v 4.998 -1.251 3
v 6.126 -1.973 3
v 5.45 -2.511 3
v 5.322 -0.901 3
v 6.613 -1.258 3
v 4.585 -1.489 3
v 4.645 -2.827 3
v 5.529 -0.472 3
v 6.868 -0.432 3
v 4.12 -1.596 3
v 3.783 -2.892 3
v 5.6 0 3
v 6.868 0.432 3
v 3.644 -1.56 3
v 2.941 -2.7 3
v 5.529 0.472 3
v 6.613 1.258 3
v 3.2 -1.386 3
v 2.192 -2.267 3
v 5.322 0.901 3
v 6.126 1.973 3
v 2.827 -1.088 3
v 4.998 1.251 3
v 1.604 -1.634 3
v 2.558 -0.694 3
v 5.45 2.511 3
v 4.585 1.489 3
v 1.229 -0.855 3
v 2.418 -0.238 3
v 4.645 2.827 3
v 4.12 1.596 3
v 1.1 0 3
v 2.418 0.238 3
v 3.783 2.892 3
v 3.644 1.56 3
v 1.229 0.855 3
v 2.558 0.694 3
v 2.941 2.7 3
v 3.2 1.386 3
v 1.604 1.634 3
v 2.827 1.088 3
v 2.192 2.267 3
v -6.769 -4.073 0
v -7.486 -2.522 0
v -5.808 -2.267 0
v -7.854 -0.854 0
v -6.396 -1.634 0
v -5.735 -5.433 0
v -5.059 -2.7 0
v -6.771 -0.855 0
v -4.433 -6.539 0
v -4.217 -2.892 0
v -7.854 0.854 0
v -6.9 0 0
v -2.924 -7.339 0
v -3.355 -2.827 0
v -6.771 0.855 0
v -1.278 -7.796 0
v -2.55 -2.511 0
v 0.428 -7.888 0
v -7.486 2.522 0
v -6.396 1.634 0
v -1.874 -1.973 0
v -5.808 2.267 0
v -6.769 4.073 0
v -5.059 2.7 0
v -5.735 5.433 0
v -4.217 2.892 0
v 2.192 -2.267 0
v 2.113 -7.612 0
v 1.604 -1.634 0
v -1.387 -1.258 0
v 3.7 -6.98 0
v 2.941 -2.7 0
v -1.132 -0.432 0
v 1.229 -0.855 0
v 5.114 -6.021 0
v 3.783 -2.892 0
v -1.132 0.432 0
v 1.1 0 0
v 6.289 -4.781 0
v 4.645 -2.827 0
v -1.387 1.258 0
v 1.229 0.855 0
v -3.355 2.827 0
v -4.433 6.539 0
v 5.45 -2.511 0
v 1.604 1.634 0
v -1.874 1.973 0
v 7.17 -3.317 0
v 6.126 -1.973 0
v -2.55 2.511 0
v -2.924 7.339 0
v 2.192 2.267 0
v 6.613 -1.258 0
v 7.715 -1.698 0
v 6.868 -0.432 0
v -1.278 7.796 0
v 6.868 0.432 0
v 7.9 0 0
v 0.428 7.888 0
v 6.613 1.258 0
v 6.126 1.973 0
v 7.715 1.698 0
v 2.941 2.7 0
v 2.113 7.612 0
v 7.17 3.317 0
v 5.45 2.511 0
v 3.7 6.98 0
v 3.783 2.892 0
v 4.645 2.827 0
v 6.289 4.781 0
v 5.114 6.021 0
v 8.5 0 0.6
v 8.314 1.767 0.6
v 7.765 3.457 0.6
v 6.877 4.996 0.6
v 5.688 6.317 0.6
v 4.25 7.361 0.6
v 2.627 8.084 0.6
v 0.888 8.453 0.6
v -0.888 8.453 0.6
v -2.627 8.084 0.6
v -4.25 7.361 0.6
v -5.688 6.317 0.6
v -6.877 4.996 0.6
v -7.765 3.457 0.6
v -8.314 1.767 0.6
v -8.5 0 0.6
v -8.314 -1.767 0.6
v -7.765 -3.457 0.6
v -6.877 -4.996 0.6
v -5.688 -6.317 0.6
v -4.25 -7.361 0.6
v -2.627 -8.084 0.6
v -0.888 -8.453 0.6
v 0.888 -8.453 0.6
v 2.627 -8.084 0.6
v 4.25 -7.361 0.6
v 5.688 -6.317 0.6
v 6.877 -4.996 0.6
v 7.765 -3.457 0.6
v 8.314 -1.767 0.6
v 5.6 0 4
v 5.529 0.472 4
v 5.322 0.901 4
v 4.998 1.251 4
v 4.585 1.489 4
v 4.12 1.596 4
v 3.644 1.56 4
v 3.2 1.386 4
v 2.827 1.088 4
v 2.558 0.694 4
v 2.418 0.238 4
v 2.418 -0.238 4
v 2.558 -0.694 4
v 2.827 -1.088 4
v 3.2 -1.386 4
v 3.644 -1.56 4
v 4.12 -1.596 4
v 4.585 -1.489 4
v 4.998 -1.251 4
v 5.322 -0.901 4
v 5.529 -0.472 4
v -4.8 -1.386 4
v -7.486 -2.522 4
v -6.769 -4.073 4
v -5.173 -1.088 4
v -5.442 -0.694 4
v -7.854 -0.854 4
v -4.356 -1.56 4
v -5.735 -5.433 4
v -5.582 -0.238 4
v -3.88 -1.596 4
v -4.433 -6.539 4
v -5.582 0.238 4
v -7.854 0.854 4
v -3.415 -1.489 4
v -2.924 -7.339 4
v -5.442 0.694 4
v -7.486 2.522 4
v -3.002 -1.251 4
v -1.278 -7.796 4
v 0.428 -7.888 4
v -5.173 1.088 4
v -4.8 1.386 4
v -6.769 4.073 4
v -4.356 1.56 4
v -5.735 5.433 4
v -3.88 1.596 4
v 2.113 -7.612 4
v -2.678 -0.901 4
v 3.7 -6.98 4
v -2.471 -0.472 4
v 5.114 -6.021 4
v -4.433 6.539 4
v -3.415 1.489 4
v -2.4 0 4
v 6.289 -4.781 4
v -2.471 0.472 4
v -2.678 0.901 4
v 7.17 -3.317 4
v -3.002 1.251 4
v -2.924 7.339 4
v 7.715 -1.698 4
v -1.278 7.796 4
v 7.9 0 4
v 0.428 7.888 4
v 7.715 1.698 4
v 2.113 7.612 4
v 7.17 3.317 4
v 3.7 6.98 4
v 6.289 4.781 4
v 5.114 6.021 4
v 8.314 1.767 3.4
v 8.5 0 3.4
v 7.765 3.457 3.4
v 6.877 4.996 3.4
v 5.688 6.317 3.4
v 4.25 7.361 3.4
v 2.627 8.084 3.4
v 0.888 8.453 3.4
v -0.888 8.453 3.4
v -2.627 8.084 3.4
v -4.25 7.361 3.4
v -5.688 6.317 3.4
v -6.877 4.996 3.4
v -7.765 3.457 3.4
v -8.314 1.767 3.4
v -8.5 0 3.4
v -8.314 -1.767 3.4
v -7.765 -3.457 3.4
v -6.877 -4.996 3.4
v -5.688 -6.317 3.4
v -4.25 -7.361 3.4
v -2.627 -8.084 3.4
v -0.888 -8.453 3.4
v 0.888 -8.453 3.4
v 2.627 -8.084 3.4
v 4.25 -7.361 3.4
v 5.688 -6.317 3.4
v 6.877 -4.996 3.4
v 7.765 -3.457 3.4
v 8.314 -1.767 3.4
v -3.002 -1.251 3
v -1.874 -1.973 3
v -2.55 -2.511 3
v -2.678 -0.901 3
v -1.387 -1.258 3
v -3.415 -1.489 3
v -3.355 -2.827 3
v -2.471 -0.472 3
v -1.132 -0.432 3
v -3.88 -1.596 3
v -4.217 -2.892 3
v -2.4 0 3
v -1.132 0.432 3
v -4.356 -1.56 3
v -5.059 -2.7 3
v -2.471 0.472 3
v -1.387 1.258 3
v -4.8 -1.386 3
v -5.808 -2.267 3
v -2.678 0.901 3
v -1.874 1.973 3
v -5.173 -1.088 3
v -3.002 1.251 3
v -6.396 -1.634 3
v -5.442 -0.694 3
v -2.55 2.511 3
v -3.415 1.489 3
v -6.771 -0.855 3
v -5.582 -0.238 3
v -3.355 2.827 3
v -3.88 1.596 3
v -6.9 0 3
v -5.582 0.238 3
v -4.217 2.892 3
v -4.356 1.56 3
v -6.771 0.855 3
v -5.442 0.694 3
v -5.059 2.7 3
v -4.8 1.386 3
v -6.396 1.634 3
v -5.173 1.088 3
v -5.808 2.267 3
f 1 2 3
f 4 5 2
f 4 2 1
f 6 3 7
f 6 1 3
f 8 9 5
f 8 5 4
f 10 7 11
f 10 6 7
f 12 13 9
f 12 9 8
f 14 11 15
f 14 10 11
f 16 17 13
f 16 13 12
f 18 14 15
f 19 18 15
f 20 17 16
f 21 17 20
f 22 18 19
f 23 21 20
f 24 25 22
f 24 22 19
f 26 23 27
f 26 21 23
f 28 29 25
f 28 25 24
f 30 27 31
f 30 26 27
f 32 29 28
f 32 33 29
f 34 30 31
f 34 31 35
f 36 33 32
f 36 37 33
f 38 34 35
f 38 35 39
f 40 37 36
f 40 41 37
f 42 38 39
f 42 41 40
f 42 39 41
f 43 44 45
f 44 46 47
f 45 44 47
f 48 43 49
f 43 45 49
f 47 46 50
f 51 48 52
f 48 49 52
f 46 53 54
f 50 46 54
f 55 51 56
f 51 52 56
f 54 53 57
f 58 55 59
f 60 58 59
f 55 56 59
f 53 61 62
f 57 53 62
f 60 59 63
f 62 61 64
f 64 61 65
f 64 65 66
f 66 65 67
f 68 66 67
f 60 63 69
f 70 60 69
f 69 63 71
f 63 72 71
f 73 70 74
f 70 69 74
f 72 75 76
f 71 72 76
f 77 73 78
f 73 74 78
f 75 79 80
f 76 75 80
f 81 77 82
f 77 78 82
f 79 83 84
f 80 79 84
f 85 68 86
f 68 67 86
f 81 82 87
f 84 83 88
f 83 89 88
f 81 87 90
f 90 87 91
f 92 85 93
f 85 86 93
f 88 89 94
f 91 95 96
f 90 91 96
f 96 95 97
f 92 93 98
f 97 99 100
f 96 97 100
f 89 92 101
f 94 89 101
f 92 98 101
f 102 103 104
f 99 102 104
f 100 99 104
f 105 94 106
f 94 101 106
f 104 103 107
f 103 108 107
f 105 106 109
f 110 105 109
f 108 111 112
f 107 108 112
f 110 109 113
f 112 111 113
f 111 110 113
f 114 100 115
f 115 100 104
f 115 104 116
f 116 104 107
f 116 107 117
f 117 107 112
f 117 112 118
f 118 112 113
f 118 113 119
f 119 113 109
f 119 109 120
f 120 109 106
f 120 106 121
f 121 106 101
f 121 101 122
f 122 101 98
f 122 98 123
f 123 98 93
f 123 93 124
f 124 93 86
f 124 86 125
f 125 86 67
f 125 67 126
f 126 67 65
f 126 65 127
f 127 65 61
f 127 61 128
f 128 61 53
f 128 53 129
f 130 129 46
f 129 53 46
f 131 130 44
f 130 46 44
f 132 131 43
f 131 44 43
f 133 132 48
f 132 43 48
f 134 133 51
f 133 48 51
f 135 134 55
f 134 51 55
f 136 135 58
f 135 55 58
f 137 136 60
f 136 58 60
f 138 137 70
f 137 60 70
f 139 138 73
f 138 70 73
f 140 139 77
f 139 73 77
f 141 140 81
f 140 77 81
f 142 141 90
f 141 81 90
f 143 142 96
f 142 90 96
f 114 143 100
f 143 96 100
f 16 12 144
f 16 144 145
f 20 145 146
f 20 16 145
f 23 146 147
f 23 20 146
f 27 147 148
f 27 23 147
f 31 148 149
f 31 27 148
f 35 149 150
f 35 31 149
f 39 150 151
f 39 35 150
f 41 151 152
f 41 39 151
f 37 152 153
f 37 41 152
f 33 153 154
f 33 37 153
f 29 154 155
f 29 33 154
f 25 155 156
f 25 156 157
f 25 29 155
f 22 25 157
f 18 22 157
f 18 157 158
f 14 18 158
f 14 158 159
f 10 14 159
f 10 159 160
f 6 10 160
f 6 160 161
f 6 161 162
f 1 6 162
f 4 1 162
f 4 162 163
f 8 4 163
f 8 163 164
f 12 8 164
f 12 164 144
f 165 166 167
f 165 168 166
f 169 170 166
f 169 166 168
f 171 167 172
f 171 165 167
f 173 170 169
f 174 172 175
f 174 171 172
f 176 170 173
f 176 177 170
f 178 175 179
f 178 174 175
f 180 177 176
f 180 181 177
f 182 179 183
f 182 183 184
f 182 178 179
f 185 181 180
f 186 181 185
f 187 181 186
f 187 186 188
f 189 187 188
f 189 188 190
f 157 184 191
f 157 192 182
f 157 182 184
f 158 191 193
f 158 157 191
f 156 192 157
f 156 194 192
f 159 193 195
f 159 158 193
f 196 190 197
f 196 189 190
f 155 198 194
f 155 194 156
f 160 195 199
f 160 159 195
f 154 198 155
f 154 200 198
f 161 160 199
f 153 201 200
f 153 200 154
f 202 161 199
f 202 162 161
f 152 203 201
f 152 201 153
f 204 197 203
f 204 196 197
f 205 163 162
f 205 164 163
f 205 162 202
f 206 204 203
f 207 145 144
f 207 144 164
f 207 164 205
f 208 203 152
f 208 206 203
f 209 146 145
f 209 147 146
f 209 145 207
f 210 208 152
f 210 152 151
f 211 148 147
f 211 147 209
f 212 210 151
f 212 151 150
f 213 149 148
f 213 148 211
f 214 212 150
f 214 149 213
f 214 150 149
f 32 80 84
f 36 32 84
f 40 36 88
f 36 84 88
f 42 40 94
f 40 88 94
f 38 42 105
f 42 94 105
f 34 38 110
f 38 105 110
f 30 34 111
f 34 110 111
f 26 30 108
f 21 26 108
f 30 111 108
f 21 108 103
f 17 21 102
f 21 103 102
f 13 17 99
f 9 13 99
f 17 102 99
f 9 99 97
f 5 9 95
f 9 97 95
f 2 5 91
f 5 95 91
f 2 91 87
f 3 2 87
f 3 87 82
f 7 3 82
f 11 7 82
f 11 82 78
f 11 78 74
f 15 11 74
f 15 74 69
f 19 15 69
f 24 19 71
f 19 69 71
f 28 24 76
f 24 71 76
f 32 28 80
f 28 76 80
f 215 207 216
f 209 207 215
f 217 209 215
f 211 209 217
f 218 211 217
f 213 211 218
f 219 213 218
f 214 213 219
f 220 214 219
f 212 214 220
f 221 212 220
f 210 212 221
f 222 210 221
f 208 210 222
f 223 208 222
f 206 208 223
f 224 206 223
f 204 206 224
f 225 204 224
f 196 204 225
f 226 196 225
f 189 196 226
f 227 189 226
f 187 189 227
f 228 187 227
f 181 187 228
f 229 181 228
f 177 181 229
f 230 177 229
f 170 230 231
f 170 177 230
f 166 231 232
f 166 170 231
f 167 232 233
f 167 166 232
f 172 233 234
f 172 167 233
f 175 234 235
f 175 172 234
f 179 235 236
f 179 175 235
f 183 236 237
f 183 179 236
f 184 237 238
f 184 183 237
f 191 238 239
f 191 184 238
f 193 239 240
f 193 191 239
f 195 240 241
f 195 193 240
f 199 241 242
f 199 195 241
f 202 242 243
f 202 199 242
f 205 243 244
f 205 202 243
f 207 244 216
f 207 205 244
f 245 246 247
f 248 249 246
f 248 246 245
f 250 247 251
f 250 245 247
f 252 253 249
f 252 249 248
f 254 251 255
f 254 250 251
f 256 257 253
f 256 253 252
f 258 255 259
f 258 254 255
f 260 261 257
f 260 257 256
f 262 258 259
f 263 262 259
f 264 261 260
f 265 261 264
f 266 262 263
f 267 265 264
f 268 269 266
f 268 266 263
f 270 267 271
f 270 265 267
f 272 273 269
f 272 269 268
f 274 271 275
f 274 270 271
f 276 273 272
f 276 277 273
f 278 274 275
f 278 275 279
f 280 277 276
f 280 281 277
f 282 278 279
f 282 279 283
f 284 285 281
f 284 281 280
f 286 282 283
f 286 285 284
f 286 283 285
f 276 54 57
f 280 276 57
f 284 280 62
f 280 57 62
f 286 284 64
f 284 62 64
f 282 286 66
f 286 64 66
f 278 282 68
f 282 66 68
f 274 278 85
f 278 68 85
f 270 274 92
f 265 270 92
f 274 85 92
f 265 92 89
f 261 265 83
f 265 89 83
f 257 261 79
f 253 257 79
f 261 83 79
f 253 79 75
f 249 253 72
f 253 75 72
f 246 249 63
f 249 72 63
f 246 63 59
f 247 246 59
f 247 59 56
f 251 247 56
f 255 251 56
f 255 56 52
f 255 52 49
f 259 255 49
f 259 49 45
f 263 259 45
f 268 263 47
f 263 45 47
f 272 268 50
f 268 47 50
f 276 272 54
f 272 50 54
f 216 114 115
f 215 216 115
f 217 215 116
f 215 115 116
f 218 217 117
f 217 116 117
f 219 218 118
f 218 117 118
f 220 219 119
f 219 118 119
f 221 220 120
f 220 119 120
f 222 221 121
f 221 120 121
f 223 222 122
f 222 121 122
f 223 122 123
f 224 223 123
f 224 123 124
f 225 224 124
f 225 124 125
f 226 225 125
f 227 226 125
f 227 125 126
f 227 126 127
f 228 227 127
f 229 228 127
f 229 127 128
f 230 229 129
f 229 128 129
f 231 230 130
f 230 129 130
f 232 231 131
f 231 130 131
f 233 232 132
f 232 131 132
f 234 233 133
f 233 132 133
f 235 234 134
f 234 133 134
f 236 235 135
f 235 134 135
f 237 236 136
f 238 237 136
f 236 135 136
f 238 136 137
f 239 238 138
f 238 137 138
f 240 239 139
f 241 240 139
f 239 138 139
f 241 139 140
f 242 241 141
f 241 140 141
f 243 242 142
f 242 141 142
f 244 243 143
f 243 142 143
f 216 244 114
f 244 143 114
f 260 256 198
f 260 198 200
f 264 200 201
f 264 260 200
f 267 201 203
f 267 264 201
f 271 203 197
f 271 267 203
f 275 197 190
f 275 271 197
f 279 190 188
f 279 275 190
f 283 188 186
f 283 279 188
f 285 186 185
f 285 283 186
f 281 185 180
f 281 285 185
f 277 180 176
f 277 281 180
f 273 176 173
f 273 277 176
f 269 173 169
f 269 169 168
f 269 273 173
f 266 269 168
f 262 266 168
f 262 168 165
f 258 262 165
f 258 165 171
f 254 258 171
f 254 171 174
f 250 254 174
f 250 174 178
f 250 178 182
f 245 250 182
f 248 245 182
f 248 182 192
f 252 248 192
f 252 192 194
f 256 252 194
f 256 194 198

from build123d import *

# Parameters (mm, degrees)
ESQUISSE1_R             = 8.5
ESQUISSE1_R_2           = 1.6
BOSS_EXTRU_1_DEPTH      = 4
ESQUISSE3_R             = 2.9
ENL_V_MAT_EXTRU_1_DEPTH = 3
CHANFREIN1_SIZE         = 0.6


with BuildPart() as part:
    # Esquisse1 → Boss.-Extru.1 (new body)
    with BuildSketch(Plane.XY):
        Circle(ESQUISSE1_R)
        with Locations((-4, 0)):
            Circle(ESQUISSE1_R_2, mode=Mode.SUBTRACT)
        with Locations((4, 0)):
            Circle(ESQUISSE1_R_2, mode=Mode.SUBTRACT)
    extrude(amount=BOSS_EXTRU_1_DEPTH)

    # Esquisse3 → Enlèv. mat.-Extru.1 (cut)
    with BuildSketch(Plane(origin=(0, 0, 0), x_dir=(-1, 0, 0), z_dir=(0, 0, -1))):
        with Locations((4, 0)):
            Circle(ESQUISSE3_R)
        with Locations((-4, 0)):
            Circle(ESQUISSE3_R)
    extrude(amount=-ENL_V_MAT_EXTRU_1_DEPTH, mode=Mode.SUBTRACT)

    # Chanfrein1
    chanfrein1_edges = [part.edges().sort_by_distance(p)[0] for p in [
        (-8.5, 0, 0),
        (-8.5, 0, 4),
    ]]
    chamfer(chanfrein1_edges, length=CHANFREIN1_SIZE)


solid = part.part
